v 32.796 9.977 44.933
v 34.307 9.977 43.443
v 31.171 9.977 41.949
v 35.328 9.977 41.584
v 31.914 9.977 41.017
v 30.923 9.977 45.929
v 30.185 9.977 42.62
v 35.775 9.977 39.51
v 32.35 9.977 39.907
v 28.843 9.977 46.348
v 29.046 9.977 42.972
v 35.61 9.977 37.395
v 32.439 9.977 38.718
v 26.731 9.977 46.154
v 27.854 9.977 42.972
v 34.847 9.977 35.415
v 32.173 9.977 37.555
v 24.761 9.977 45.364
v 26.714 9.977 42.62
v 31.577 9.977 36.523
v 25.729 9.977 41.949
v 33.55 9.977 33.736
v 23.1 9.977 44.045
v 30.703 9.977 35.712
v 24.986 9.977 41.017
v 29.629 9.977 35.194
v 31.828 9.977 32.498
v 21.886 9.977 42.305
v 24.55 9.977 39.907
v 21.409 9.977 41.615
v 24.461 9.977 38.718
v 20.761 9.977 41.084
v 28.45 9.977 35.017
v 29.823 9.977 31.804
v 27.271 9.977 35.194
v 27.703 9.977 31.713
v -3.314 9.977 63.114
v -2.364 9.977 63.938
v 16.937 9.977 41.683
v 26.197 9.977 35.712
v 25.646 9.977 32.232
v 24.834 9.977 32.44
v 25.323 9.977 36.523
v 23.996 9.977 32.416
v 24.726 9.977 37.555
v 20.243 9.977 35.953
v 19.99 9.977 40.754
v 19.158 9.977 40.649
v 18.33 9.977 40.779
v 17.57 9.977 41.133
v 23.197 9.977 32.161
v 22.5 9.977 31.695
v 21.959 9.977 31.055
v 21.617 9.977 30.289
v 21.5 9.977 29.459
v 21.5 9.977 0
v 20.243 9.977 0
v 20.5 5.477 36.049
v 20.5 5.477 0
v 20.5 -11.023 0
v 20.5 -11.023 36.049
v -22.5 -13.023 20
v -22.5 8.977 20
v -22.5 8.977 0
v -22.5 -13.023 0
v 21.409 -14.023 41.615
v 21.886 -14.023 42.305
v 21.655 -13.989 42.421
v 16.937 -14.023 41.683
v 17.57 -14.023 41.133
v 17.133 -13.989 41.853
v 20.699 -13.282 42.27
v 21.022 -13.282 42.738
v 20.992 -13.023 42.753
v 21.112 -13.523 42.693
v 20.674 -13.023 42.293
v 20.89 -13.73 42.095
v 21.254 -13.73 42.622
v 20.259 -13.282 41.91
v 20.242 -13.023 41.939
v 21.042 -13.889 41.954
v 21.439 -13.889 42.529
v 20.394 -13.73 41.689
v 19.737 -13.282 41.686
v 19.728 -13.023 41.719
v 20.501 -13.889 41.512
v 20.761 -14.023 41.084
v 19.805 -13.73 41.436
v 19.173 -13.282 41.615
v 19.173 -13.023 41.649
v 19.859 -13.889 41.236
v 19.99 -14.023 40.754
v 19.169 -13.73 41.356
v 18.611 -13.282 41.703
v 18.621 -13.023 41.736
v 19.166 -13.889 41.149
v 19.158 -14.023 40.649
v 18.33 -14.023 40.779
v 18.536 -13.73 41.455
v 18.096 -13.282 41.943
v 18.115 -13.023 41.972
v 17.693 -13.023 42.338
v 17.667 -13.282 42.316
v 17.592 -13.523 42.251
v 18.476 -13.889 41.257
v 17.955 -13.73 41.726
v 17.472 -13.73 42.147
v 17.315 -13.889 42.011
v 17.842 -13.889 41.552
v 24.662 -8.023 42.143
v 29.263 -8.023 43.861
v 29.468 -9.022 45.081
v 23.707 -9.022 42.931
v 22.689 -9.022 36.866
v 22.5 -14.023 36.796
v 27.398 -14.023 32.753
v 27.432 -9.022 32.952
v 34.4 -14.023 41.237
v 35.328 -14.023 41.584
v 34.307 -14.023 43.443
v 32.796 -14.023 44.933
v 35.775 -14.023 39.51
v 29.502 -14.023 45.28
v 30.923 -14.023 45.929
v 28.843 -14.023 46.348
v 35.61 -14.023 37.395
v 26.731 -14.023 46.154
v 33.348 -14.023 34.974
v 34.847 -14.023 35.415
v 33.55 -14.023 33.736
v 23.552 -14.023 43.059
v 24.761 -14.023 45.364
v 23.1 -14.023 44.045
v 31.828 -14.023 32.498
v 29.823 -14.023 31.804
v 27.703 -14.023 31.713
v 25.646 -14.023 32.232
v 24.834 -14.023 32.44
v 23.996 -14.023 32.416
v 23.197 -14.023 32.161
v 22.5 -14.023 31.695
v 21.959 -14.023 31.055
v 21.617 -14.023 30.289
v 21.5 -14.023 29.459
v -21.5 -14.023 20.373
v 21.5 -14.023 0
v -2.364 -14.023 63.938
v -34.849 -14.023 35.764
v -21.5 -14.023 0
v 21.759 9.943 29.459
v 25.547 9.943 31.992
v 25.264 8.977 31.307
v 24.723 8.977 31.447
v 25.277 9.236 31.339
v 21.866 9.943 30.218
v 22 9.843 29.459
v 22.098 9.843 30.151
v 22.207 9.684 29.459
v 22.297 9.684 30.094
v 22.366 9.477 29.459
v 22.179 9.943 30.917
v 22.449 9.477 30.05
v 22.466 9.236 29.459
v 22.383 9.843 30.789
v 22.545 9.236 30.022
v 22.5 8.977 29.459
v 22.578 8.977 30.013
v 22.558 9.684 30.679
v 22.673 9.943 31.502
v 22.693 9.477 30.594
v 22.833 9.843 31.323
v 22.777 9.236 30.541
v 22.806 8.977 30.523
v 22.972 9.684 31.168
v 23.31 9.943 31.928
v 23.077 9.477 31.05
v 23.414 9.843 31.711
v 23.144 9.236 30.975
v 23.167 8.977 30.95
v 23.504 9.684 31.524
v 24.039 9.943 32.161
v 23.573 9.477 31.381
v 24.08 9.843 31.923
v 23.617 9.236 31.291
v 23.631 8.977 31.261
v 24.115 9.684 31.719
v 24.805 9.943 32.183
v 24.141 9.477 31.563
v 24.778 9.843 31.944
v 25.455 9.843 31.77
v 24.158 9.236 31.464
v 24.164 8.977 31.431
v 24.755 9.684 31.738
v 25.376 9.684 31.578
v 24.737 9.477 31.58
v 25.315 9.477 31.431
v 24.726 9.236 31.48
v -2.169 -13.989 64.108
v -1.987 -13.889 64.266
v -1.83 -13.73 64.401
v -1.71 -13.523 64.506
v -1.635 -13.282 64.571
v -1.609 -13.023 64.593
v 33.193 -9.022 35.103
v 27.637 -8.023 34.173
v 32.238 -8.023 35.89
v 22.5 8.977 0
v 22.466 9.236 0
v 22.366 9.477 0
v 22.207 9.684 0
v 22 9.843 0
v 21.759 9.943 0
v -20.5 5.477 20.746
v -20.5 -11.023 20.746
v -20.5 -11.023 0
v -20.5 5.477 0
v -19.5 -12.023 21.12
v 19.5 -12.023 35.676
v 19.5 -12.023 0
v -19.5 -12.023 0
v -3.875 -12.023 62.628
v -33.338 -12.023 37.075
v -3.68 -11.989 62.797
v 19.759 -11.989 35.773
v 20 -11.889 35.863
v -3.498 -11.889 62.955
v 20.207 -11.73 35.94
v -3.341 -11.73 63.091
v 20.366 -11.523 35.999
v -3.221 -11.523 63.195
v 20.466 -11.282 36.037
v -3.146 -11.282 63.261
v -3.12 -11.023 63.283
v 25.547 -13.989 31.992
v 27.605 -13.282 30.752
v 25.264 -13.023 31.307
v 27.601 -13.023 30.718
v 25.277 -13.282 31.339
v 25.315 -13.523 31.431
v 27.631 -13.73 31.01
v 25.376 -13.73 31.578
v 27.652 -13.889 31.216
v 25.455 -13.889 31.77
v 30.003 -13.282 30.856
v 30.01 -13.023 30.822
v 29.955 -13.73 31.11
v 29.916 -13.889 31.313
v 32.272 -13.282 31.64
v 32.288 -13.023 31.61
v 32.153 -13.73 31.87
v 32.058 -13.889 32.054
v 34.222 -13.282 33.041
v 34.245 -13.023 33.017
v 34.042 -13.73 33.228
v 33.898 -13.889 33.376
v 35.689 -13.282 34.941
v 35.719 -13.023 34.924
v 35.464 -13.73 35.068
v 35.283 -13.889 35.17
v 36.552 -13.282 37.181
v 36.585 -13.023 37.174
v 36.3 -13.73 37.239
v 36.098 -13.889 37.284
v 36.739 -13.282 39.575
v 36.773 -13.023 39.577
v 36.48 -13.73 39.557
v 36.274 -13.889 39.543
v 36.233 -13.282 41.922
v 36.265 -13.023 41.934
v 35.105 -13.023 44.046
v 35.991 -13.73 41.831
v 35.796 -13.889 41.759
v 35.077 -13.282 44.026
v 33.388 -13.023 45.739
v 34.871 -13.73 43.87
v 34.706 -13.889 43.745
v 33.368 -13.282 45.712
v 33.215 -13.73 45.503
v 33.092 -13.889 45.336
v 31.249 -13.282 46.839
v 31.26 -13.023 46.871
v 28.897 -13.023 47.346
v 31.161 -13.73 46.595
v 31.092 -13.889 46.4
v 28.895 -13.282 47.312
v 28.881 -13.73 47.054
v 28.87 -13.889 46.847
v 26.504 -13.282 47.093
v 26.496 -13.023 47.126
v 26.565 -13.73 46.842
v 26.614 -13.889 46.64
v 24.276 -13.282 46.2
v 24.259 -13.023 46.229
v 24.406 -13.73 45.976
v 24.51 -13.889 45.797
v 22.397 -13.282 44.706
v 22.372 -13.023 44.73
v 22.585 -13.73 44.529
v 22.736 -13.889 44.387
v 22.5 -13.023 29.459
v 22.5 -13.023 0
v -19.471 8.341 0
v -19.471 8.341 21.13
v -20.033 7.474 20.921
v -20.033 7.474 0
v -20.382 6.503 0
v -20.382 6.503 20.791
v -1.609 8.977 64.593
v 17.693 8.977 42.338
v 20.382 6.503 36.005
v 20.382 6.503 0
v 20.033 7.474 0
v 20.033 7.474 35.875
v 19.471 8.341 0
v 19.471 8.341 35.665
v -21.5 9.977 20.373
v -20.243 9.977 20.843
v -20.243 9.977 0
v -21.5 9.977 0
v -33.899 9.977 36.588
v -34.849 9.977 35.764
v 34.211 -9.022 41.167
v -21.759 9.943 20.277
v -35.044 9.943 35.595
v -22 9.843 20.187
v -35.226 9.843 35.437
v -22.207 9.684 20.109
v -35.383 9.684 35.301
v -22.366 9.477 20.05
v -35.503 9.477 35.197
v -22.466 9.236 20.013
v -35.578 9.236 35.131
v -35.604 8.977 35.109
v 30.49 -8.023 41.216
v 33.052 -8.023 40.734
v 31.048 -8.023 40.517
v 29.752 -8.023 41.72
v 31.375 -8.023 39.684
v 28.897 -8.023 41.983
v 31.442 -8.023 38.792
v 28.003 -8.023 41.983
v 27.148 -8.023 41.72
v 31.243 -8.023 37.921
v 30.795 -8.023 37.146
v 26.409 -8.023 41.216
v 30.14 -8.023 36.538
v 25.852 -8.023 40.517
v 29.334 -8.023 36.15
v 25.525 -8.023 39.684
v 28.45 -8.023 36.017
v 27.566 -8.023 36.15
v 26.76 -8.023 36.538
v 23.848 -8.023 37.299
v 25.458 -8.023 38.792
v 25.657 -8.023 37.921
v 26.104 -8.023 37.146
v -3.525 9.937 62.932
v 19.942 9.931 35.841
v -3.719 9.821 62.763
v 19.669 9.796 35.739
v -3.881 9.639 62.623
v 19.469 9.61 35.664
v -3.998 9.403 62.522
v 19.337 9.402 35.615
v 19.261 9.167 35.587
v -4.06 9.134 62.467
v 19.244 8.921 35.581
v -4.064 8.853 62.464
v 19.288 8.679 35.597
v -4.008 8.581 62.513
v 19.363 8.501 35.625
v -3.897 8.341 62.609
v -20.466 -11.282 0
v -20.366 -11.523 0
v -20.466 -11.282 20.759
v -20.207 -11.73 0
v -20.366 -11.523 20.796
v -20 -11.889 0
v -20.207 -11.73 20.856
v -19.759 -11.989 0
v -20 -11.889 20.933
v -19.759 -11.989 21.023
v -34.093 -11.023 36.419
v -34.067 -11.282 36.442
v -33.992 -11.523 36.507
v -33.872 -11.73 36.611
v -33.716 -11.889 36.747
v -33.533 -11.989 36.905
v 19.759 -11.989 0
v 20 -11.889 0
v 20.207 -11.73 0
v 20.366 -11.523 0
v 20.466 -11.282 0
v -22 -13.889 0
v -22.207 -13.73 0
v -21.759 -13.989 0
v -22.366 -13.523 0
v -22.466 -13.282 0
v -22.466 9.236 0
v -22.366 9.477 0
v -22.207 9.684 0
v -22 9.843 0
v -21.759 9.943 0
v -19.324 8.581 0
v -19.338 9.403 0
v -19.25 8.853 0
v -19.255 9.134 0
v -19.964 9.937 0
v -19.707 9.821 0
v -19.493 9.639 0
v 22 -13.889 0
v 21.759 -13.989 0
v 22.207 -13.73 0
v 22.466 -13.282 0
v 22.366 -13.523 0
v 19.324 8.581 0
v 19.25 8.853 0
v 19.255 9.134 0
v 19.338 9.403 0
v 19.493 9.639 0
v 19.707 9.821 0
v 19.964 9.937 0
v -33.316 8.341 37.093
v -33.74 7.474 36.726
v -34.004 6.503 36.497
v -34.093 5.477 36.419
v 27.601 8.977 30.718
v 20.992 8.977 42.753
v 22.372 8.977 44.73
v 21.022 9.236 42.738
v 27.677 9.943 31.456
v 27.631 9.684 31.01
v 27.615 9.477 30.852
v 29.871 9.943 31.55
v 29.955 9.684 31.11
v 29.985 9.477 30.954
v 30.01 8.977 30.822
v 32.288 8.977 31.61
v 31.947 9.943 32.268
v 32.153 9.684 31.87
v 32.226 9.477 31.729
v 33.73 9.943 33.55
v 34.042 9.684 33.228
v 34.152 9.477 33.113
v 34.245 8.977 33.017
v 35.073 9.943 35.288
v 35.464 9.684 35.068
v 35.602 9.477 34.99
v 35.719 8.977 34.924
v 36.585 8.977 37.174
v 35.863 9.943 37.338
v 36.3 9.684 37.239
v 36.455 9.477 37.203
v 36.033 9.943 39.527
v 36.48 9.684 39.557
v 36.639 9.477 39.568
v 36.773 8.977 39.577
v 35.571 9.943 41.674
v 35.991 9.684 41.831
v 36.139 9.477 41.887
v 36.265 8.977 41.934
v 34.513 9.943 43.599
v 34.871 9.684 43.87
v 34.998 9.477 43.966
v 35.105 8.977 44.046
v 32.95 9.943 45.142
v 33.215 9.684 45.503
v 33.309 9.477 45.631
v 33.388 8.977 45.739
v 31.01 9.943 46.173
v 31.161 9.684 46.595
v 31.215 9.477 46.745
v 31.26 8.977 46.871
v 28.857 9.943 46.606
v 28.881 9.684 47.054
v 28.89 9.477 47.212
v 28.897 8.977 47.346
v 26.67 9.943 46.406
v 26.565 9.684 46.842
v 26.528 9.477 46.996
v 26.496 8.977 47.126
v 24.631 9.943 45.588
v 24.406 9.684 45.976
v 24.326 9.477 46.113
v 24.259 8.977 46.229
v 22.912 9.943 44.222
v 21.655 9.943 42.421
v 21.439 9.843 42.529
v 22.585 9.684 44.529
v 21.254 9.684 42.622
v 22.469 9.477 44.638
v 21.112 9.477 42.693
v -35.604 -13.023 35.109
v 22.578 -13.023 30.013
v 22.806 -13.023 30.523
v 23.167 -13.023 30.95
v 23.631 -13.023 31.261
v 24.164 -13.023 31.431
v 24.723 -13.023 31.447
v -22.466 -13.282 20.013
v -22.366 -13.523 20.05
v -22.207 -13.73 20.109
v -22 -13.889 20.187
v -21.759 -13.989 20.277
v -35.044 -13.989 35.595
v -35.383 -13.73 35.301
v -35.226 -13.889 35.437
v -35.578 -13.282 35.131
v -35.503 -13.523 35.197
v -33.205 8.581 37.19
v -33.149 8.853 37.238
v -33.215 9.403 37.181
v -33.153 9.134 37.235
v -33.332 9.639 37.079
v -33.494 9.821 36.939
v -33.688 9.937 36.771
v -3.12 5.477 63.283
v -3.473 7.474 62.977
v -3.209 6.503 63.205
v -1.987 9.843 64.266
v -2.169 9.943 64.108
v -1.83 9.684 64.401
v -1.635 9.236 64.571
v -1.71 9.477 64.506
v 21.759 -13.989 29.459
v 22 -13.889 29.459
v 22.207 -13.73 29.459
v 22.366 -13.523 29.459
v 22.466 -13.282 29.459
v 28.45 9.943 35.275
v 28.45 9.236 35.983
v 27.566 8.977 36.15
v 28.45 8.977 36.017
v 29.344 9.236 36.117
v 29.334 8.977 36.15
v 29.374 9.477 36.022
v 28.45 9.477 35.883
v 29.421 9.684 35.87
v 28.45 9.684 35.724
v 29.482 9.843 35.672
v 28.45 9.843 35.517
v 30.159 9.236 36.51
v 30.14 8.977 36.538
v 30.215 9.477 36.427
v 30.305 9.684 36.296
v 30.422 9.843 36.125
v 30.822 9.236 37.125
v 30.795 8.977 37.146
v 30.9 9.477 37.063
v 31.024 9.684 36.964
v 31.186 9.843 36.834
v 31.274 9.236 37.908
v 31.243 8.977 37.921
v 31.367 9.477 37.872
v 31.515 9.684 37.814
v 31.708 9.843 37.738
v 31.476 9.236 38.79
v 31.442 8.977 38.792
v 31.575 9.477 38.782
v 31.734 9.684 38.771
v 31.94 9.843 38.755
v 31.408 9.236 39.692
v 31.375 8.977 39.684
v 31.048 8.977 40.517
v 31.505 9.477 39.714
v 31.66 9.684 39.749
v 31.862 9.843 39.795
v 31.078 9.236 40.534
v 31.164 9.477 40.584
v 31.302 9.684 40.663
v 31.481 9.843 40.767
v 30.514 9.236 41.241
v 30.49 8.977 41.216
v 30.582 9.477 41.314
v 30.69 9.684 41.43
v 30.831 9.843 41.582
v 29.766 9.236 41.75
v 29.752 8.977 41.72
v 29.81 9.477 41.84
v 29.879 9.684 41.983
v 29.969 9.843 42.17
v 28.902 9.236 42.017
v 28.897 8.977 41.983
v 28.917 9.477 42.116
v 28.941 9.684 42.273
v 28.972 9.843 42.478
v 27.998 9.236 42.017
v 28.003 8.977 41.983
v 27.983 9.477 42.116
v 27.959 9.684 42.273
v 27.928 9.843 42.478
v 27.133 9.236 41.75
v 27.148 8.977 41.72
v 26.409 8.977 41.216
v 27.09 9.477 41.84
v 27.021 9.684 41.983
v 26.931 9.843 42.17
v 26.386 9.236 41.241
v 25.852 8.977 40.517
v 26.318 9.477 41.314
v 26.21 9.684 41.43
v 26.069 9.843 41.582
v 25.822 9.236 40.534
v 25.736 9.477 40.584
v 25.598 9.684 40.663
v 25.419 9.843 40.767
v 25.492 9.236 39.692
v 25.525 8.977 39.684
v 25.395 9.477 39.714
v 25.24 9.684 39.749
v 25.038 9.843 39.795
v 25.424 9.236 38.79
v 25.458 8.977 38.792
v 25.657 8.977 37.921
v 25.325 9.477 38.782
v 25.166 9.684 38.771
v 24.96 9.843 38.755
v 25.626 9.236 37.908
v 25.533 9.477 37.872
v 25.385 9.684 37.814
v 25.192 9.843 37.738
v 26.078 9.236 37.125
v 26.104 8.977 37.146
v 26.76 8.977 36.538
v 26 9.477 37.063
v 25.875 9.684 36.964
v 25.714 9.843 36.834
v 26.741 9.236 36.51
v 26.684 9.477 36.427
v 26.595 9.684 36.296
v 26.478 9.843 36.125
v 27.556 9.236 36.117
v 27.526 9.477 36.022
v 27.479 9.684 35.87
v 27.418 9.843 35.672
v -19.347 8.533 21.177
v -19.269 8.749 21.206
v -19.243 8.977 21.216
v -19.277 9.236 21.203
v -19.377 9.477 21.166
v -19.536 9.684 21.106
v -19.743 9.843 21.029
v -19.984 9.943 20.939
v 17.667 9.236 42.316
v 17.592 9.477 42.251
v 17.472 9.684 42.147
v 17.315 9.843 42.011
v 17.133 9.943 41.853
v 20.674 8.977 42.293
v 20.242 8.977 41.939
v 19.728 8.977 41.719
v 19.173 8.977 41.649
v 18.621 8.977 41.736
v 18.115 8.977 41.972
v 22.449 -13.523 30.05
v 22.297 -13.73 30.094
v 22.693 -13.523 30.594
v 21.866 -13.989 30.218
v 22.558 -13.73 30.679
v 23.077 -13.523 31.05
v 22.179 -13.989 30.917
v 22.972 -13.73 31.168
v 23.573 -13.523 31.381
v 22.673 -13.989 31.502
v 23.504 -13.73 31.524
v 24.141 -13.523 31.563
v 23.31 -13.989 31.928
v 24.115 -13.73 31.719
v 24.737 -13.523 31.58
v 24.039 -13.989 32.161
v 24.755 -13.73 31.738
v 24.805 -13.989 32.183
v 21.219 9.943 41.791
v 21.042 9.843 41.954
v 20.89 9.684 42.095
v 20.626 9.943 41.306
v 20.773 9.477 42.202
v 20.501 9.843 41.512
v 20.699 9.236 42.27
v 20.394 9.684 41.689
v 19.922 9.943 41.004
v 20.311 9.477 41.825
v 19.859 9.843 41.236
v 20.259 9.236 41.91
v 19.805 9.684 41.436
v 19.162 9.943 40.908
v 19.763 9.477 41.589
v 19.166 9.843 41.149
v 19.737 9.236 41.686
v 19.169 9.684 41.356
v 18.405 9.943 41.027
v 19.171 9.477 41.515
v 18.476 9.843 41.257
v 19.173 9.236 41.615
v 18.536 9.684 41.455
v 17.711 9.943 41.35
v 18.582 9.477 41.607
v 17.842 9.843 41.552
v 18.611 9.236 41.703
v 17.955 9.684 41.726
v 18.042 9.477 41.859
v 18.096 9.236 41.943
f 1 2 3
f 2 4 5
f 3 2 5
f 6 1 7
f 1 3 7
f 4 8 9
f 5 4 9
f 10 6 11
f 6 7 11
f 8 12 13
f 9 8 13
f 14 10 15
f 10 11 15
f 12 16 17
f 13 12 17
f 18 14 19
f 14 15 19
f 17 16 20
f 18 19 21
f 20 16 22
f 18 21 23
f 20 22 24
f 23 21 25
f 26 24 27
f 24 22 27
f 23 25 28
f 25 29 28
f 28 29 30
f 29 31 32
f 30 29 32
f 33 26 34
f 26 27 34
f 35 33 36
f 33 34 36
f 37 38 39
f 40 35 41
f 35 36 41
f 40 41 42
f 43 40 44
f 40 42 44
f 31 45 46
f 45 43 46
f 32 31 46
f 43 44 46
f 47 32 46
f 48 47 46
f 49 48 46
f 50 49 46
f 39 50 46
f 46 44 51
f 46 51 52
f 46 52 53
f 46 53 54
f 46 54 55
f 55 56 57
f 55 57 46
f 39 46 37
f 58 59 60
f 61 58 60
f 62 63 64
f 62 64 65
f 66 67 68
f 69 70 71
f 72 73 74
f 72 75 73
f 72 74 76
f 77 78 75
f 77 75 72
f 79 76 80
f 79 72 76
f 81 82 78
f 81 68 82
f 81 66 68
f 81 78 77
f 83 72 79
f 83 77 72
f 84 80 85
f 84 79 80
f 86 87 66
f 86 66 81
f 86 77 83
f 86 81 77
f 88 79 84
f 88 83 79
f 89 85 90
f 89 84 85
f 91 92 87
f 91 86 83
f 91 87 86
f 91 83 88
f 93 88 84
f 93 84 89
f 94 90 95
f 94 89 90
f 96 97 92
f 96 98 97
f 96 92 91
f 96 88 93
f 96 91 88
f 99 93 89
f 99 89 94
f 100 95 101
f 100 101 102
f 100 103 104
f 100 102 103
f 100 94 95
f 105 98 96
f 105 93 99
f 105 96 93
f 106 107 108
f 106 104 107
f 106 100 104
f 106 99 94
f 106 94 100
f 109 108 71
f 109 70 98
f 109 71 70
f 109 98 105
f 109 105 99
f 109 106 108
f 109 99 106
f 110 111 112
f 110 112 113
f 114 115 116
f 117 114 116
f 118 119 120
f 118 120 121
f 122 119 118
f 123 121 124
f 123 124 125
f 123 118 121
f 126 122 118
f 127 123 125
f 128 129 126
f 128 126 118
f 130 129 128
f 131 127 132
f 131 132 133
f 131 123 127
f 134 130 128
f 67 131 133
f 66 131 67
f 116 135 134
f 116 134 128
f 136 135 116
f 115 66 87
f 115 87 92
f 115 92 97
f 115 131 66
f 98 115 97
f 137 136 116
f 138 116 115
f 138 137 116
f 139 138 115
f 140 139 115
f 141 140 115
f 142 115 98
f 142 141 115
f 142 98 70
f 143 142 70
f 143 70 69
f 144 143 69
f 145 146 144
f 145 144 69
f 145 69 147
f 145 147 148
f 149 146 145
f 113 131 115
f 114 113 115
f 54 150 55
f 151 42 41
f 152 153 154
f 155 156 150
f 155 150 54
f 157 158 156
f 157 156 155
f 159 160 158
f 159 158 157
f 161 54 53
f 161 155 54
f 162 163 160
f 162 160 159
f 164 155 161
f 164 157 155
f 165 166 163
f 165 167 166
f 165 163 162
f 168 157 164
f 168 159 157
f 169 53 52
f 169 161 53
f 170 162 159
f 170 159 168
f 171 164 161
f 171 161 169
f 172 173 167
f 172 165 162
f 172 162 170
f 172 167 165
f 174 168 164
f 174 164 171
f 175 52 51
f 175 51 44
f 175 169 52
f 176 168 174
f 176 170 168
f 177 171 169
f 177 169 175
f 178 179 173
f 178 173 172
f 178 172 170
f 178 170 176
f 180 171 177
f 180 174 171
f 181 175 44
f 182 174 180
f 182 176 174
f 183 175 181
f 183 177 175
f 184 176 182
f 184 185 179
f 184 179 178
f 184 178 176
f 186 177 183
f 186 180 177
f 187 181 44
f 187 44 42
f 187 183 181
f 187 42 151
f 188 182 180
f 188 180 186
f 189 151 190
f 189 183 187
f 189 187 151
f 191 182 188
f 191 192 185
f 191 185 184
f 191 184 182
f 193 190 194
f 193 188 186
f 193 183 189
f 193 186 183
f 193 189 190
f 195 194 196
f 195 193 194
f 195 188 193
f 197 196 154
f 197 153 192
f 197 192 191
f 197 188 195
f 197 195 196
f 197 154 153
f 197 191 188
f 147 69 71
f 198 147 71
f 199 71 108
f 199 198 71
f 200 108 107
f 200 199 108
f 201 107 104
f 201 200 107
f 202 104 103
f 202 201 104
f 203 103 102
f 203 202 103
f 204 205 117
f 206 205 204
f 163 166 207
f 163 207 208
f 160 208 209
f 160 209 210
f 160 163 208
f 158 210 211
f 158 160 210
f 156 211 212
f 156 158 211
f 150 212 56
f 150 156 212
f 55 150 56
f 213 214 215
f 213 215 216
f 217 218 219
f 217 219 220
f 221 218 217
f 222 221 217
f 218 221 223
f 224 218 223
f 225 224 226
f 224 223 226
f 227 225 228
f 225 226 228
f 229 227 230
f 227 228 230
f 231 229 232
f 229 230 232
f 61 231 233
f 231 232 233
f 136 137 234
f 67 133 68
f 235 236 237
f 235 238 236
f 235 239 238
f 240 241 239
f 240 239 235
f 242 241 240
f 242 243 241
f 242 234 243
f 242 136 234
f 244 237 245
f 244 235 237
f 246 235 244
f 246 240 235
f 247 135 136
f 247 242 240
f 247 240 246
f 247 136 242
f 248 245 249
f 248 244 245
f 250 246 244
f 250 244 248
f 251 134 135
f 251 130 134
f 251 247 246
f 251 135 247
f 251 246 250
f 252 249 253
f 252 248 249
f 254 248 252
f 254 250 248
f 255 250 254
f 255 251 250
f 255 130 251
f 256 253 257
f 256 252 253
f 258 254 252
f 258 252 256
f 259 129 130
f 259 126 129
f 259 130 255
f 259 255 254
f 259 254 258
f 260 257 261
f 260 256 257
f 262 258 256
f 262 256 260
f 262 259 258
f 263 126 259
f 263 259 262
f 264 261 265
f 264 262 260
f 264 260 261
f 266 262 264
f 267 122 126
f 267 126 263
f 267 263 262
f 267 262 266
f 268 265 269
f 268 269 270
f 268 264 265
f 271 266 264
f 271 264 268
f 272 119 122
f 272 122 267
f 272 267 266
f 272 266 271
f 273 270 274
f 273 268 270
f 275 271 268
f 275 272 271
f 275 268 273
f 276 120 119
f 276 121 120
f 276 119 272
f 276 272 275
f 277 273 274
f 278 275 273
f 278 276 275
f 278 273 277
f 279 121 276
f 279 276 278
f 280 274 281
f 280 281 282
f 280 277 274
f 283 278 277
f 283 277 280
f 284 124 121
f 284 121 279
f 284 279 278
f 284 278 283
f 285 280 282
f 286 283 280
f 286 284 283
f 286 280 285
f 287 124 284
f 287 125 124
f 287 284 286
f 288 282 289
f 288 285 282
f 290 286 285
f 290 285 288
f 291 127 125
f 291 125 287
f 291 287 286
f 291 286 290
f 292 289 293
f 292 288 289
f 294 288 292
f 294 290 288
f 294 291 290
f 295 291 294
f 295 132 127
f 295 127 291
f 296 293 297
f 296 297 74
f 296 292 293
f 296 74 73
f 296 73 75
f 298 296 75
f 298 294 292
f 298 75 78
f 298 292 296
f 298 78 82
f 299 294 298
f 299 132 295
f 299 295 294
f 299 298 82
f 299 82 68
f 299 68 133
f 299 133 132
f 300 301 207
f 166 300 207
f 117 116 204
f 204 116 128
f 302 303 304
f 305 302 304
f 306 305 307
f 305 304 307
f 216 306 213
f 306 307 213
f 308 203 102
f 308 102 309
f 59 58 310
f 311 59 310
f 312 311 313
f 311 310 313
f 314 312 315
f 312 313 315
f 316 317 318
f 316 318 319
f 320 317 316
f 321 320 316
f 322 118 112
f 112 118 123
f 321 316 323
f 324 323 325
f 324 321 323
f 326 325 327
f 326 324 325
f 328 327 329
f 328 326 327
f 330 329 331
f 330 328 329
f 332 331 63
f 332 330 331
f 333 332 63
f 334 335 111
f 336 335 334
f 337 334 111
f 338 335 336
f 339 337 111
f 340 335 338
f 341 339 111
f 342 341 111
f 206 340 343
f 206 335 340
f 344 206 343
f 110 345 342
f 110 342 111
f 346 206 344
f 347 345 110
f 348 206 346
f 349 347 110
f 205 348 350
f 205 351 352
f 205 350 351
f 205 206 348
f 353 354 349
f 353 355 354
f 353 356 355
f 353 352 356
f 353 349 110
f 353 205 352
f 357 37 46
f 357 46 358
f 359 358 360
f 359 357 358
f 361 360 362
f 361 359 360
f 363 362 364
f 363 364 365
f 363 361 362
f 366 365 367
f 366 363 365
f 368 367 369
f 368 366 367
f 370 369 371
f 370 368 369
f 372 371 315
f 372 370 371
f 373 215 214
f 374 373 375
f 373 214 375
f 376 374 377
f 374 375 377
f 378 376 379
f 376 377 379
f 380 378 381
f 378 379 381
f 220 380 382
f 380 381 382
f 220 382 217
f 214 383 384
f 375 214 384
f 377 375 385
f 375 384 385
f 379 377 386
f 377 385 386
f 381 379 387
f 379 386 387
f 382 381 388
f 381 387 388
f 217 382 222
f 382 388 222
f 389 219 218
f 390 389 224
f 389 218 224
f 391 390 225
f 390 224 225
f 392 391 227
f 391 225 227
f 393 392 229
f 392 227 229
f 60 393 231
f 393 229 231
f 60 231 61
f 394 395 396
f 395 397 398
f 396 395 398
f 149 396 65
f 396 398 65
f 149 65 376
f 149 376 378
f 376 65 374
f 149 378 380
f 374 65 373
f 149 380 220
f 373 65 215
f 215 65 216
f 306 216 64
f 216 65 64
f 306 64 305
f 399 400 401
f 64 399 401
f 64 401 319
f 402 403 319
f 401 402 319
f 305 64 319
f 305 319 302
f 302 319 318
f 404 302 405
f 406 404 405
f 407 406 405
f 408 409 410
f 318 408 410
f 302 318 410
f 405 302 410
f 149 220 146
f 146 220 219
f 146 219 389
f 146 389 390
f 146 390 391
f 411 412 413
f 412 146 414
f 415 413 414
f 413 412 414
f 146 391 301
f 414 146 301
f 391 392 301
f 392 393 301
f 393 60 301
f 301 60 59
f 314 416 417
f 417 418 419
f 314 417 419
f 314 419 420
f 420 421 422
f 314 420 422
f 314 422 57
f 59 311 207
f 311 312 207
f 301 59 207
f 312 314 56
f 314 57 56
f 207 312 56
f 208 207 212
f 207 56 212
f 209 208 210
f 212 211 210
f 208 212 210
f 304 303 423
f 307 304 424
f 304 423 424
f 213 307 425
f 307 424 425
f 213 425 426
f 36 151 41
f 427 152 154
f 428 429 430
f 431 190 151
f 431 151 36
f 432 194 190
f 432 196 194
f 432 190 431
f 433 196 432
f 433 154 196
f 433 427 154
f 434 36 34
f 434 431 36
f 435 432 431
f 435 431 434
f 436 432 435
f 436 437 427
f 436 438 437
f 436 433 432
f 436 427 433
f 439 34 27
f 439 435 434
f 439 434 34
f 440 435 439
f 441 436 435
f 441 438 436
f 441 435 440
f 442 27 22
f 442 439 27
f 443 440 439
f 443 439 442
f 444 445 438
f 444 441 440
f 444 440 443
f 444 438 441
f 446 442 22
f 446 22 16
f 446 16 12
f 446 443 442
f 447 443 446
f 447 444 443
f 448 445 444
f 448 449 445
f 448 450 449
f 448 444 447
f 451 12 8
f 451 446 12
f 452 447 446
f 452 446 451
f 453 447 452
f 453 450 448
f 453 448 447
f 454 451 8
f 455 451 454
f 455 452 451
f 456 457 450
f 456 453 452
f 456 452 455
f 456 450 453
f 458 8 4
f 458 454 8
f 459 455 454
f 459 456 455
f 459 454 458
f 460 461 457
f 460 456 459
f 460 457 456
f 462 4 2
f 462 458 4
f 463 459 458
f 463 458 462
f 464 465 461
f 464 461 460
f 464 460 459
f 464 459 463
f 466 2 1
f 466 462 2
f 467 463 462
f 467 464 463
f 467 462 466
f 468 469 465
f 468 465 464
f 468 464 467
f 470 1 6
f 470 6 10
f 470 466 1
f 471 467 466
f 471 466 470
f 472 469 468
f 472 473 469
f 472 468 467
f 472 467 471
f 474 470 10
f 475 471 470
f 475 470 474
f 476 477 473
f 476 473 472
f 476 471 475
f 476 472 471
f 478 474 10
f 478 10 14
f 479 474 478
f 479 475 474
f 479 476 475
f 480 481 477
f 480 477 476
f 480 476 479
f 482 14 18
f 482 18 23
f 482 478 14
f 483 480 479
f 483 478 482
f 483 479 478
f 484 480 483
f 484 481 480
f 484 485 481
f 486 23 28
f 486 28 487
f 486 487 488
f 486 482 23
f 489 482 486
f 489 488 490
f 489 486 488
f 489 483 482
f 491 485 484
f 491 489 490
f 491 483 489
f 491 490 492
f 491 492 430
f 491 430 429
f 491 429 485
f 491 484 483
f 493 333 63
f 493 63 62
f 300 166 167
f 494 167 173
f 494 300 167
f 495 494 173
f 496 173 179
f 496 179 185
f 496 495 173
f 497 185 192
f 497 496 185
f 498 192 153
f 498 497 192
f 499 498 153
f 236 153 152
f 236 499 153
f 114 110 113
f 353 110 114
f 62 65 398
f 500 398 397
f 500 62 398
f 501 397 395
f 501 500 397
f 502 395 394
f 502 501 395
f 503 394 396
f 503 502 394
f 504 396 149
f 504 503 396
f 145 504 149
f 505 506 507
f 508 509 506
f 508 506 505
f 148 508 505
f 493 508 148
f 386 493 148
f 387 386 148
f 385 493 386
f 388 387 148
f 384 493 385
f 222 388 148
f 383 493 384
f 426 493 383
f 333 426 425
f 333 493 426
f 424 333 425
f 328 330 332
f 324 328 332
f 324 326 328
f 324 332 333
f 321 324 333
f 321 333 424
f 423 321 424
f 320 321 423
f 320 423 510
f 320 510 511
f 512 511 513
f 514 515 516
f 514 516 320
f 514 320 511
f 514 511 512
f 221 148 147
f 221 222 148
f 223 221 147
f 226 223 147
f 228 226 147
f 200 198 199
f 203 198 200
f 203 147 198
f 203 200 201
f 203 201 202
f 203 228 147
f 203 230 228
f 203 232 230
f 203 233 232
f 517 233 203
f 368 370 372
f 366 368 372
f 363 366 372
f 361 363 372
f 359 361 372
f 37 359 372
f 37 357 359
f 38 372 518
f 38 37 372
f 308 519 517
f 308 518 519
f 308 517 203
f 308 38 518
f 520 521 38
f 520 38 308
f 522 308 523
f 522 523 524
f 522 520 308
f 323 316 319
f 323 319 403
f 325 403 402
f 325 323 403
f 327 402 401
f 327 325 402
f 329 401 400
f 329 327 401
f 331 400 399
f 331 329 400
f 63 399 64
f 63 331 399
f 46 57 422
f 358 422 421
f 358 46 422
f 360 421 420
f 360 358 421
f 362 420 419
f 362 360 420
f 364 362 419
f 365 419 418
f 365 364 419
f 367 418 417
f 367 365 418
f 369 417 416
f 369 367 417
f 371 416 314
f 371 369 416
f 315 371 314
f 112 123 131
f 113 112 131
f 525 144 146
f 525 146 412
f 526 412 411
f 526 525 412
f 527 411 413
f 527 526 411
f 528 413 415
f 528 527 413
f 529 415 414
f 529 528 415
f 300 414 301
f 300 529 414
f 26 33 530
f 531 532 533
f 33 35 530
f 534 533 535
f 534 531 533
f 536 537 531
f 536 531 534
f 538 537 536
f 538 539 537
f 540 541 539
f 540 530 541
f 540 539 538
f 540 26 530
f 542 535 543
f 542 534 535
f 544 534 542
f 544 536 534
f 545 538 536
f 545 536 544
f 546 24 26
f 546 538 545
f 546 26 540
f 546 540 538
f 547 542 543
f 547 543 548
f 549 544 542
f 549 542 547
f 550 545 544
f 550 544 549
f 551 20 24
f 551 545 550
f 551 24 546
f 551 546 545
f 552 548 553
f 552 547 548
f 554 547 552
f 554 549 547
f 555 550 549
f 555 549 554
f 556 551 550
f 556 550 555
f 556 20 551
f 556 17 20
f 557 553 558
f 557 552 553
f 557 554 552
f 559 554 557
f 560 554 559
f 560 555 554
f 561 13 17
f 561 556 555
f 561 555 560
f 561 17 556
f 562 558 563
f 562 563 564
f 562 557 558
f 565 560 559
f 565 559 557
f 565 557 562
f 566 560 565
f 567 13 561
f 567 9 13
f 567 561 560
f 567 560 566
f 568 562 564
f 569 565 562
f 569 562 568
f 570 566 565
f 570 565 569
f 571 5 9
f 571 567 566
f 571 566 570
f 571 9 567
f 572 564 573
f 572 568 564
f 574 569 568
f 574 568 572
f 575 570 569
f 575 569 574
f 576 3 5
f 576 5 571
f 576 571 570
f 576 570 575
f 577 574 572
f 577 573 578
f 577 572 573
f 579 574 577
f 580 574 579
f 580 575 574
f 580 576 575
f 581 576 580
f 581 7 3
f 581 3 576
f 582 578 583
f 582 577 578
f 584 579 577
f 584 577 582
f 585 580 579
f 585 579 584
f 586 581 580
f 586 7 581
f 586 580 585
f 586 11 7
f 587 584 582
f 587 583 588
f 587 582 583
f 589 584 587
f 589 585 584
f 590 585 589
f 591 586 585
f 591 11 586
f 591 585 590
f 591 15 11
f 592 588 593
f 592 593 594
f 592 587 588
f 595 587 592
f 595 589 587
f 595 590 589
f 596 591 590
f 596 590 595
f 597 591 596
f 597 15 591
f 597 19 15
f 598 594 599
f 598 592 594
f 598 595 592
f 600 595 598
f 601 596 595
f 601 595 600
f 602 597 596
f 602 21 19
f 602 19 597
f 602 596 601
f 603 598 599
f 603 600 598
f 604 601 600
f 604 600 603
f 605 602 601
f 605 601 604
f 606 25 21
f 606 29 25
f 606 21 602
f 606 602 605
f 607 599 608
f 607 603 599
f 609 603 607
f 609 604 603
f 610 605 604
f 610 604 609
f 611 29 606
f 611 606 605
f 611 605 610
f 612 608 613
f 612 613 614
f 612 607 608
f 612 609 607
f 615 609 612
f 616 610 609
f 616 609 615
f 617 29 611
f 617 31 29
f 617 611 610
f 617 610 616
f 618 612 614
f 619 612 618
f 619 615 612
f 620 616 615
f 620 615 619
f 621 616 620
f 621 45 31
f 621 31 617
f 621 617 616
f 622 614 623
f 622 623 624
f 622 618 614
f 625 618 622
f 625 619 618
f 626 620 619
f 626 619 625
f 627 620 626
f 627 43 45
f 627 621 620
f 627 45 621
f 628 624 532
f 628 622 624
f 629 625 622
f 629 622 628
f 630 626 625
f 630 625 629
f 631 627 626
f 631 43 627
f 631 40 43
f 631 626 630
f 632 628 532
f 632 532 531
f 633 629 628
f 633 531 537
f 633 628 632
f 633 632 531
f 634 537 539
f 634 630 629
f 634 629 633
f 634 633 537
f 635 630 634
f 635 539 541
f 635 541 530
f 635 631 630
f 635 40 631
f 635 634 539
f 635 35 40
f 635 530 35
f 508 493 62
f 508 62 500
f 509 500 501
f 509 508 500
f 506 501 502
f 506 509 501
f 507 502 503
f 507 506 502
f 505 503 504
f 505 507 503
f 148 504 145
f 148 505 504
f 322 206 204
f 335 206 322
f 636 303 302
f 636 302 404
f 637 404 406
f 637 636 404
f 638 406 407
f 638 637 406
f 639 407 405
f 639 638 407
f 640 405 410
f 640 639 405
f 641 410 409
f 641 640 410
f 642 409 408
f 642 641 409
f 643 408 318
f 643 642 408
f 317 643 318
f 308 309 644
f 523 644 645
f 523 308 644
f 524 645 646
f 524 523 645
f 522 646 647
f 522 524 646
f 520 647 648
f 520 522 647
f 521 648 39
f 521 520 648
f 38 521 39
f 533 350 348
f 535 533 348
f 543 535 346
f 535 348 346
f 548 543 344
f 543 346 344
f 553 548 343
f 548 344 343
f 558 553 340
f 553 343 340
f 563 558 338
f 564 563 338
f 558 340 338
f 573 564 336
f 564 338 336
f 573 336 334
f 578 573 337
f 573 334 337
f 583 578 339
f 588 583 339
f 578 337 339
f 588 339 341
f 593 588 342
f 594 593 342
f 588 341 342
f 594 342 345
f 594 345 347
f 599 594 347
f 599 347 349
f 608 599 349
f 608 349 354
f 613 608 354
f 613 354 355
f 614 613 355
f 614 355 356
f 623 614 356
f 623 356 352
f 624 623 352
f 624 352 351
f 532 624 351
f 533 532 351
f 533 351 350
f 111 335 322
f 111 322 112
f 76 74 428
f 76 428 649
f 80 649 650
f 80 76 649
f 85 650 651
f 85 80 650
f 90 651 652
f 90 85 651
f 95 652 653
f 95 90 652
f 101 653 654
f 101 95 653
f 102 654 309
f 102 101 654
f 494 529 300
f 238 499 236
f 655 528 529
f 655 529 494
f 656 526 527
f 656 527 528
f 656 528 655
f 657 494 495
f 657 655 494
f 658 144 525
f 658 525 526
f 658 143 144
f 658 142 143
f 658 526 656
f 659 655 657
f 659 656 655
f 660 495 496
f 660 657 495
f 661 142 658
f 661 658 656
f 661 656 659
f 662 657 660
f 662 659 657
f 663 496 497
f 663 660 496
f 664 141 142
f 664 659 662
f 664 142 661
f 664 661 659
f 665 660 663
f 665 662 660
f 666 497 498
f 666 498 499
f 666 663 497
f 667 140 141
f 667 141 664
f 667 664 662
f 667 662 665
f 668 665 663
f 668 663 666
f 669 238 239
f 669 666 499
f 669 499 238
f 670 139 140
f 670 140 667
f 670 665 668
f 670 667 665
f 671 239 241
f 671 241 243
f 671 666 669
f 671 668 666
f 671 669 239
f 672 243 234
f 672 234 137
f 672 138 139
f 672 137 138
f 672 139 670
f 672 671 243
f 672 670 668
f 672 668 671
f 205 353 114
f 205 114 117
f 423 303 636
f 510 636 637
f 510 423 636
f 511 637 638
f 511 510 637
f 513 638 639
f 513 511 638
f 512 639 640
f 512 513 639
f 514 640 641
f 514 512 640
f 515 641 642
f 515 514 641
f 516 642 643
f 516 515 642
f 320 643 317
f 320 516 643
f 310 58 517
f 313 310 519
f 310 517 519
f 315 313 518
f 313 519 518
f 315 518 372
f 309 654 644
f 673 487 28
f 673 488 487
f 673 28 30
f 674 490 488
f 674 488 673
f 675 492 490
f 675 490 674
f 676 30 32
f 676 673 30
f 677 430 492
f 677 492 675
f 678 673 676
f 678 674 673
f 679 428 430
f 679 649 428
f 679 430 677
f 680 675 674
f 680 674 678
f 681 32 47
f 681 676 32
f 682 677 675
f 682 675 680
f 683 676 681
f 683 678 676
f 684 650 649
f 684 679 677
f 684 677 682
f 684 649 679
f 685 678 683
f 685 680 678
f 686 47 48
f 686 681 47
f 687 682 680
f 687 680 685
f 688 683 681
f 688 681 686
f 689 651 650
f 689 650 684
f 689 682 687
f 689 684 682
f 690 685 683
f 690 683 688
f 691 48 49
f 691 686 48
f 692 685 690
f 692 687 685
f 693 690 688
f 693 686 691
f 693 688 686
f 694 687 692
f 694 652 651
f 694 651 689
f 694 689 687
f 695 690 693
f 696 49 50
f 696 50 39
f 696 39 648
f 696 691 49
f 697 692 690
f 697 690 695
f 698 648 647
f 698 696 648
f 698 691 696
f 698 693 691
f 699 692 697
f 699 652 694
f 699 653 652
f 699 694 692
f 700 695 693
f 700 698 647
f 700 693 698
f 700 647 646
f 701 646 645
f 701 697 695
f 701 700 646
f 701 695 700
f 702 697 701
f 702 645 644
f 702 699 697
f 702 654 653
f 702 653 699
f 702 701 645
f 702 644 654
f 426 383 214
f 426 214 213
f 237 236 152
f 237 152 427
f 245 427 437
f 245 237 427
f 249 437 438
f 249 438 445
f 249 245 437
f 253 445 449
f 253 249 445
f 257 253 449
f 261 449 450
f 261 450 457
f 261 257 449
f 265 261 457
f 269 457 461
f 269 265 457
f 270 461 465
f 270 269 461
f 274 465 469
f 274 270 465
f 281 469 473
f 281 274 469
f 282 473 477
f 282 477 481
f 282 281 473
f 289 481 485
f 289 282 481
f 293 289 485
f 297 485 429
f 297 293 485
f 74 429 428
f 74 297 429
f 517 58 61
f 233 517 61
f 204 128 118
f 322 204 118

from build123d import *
from OCP.BRepFilletAPI import BRepFilletAPI_MakeChamfer

# Parameters (mm, degrees)
SKETCH4_R           = 2.9999999999999982
BOSS_EXTRUDE2_DEPTH = 24
CUT_EXTRUDE2_DEPTH  = 6
CUT_EXTRUDE2_DRAFT  = -2.0000000000000044
CHAMFER1_SIZE       = 1
CHAMFER1_SIZE2      = 1.0368159552784713
FILLET8_R           = 1


with BuildPart() as part:
    # Sweep1: sweep along a path in Sketch3
    with BuildLine(Plane(origin=(0, 0, 0), x_dir=(1, 0, 0), z_dir=(0, 1, 0))) as sweep1_path:
        Line((0, 0), (3.43e-15, -28.397932341701697))
        Line((3.43e-15, -28.397932341701697), (-18.606512367640427, -49.85114326213761))
    # Sketch1 → Sweep1 (sweep)
    with BuildSketch(Plane.XY):
        with BuildLine():
            Line((-19.500000000000004, -12.023018516113881), (19.500000000000004, -12.023018516113881))
            ThreePointArc((19.500000000000004, -12.023018516113881), (20.207106781186553, -11.730125297300427), (20.499999999999996, -11.02301851611388))
            Line((20.499999999999996, -11.02301851611388), (20.5, 5.476981483886118))
            ThreePointArc((20.5, 5.476981483886118), (20.235010721400677, 6.998390104086923), (19.471251471279412, 8.34061784752248))
            ThreePointArc((19.471251471279412, 8.34061784752248), (19.338106653385996, 9.403382916597337), (20.242640687119284, 9.976981483886115))
            Line((20.242640687119284, 9.976981483886115), (21.5, 9.976981483886117))
            ThreePointArc((21.5, 9.976981483886117), (22.207106781186546, 9.684088265072665), (22.5, 8.976981483886117))
            Line((22.5, 8.976981483886117), (22.500000000000004, -13.023018516113874))
            ThreePointArc((22.500000000000004, -13.023018516113874), (22.20710678118655, -13.730125297300424), (21.5, -14.023018516113883))
            Line((21.5, -14.023018516113883), (-21.5, -14.023018516113883))
            ThreePointArc((-21.5, -14.023018516113883), (-22.20710678118655, -13.730125297300424), (-22.500000000000004, -13.023018516113874))
            Line((-22.500000000000004, -13.023018516113874), (-22.5, 8.976981483886117))
            ThreePointArc((-22.5, 8.976981483886117), (-22.207106781186546, 9.684088265072665), (-21.5, 9.976981483886117))
            Line((-21.5, 9.976981483886117), (-20.242640687119284, 9.976981483886115))
            ThreePointArc((-20.242640687119284, 9.976981483886115), (-19.338106653385996, 9.403382916597337), (-19.471251471279412, 8.34061784752248))
            ThreePointArc((-19.471251471279412, 8.34061784752248), (-20.235010721400677, 6.998390104086923), (-20.5, 5.476981483886118))
            Line((-20.5, 5.476981483886118), (-20.499999999999996, -11.02301851611388))
            ThreePointArc((-20.499999999999996, -11.02301851611388), (-20.207106781186553, -11.730125297300429), (-19.500000000000004, -12.023018516113881))
        make_face()
    sweep(path=sweep1_path.line, transition=Transition.RIGHT)

    # Sketch4 → Boss-Extrude2 (add, through all)
    with BuildSketch(Plane(origin=(0, -14.023018516113883, 0), x_dir=(-1, 0, 0), z_dir=(0, -1, 0))):
        with BuildLine():
            Line((-21.5, -34.67531871716202), (-21.5, -29.459053367546638))
            Line((-21.5, -29.459053367546638), (-22.500000000000004, -29.459053367546638))
            ThreePointArc((-22.500000000000004, -29.459053367546638), (-23.388194611615152, -31.12154811290928), (-25.26388877835841, -31.307423983602327))
            ThreePointArc((-25.263888778358414, -31.307423983602334), (-36.264928425658965, -41.93350635482782), (-20.991916583156645, -42.753023981442176))
            ThreePointArc((-20.991916583156645, -42.75302398144217), (-19.45313679656983, -41.66447668579883), (-17.692872887894488, -42.33845696613024))
            Line((-17.692872887894488, -42.33845696613024), (-16.93742313675424, -41.68325037771543))
            Line((-16.93742313675424, -41.68325037771543), (-21.5, -36.42262324599441))
            Line((-21.5, -36.42262324599441), (-21.5, -34.67531871716202))
        make_face()
        with Locations(Location((-28.449921846657176, -39.01662206592069, 0), (0, 0, 90))):
            Circle(SKETCH4_R, mode=Mode.SUBTRACT)
    extrude(amount=-BOSS_EXTRUDE2_DEPTH)


with BuildPart() as cut_extrude2_tool:
    # Sketch5 → Cut-Extrude2 (with draft: the straight prism first)
    with BuildSketch(Plane(origin=(0, -14.023018516113883, 0), x_dir=(-1, 0, 0), z_dir=(0, -1, 0))):
        Polygon((-29.501650461083923, -45.27978422691646), (-23.551728614426768, -43.05902684439915), (-22.500000000000025, -36.79586468340338), (-27.39819323223043, -32.75345990492492), (-33.348115078887595, -34.974217287442244), (-34.39984369331434, -41.237379448438006), align=None)
    extrude(amount=-CUT_EXTRUDE2_DEPTH)
    # Cut-Extrude2: the draft: its side faces are tilted about the plane it starts from
    cut_extrude2_sides = [cut_extrude2_tool.faces().sort_by_distance(p)[0] for p in [
        (26.526689538, -11.023018516, 44.169405536),
        (23.025864307, -11.023018516, 39.927445764),
        (24.949096616, -11.023018516, 34.774662294),
        (30.373154156, -11.023018516, 33.863838596),
        (33.873979386, -11.023018516, 38.105798368),
        (31.950747077, -11.023018516, 43.258581838),
    ]]
    draft(cut_extrude2_sides, Plane(origin=(0, -14.023018516113883, 0), x_dir=(-1, 0, 0), z_dir=(0, -1, 0)), CUT_EXTRUDE2_DRAFT)


with BuildPart() as part_1:
    add(part.part)

    # Cut-Extrude2: cut by cut_extrude2_tool
    add(cut_extrude2_tool.part, mode=Mode.SUBTRACT)

    # Chamfer1: one chamfer whose edges measure the first distance from different faces: ONE call of the kernel's chamfer builder (chamfer() names one face for all edges)
    chamfer1_edges_1 = [part_1.edges().sort_by_distance(p)[0] for p in [
        (33.667347826415636, -8.023018516113883, 38.14049654729082),
    ]]
    chamfer1_side_1 = [part_1.faces().sort_by_distance(p)[0] for p in [
        (33.77133231943445, -11.042436068122724, 38.123035165331785),
    ]]
    chamfer1_edges_2 = [part_1.edges().sort_by_distance(p)[0] for p in [
        (30.299887880499114, -8.023018516113883, 34.060135865770036),
    ]]
    chamfer1_side_2 = [part_1.faces().sort_by_distance(p)[0] for p in [
        (30.336758126646806, -11.042436068122724, 33.96135196223658),
    ]]
    chamfer1_edges_3 = [part_1.edges().sort_by_distance(p)[0] for p in [
        (25.08246190074066, -8.023018516113883, 34.936261384399906),
    ]]
    chamfer1_side_3 = [part_1.faces().sort_by_distance(p)[0] for p in [
        (25.015347653869544, -11.042436068122724, 34.854938862825485),
    ]]
    chamfer1_edges_4 = [part_1.edges().sort_by_distance(p)[0] for p in [
        (23.232495866898734, -8.023018516113883, 39.89274758455057),
    ]]
    chamfer1_side_4 = [part_1.faces().sort_by_distance(p)[0] for p in [
        (23.12851137387992, -11.042436068122724, 39.91020896650961),
    ]]
    chamfer1_edges_5 = [part_1.edges().sort_by_distance(p)[0] for p in [
        (26.599955812815256, -8.023018516113883, 43.97310826607136),
    ]]
    chamfer1_side_5 = [part_1.faces().sort_by_distance(p)[0] for p in [
        (26.56308556666756, -11.042436068122724, 44.07189216960481),
    ]]
    chamfer1_edges_6 = [part_1.edges().sort_by_distance(p)[0] for p in [
        (31.81738179257371, -8.023018516113883, 43.09698274744148),
    ]]
    chamfer1_side_6 = [part_1.faces().sort_by_distance(p)[0] for p in [
        (31.88449603944482, -11.042436068122724, 43.178305269015894),
    ]]
    chamfer1 = BRepFilletAPI_MakeChamfer(part_1.part.solid().wrapped)
    for e in chamfer1_edges_1:
        chamfer1.Add(CHAMFER1_SIZE, CHAMFER1_SIZE2, e.wrapped, chamfer1_side_1[0].wrapped)  # the first distance lies on this face
    for e in chamfer1_edges_2:
        chamfer1.Add(CHAMFER1_SIZE, CHAMFER1_SIZE2, e.wrapped, chamfer1_side_2[0].wrapped)  # the first distance lies on this face
    for e in chamfer1_edges_3:
        chamfer1.Add(CHAMFER1_SIZE, CHAMFER1_SIZE2, e.wrapped, chamfer1_side_3[0].wrapped)  # the first distance lies on this face
    for e in chamfer1_edges_4:
        chamfer1.Add(CHAMFER1_SIZE, CHAMFER1_SIZE2, e.wrapped, chamfer1_side_4[0].wrapped)  # the first distance lies on this face
    for e in chamfer1_edges_5:
        chamfer1.Add(CHAMFER1_SIZE, CHAMFER1_SIZE2, e.wrapped, chamfer1_side_5[0].wrapped)  # the first distance lies on this face
    for e in chamfer1_edges_6:
        chamfer1.Add(CHAMFER1_SIZE, CHAMFER1_SIZE2, e.wrapped, chamfer1_side_6[0].wrapped)  # the first distance lies on this face
    add(Compound.cast(chamfer1.Shape()), mode=Mode.REPLACE)

    # Fillet8
    # the kernel refuses this fillet: 1 mm, written as the material it takes off along each edge
    with BuildSketch(Plane(origin=(24.500000000000004, -14.023018516113883, 29.459053367546634), x_dir=(-0.31457819430358575, 0, -0.9492315627225506), z_dir=(0.9492315627225506, 0, -0.31457819430358575))) as fillet8_piece_1:
        with BuildLine():
            CenterArc((2 + FILLET8_R, FILLET8_R), FILLET8_R, 180, 90)
            Line((2, FILLET8_R), (2, 0))
            Line((2, 0), (2 + FILLET8_R, 0))
        make_face()
    revolve(axis=Axis((24.500000000000004, -14.023018516113883, 29.459053367546634), (0, 1, 0)), revolution_arc=184.1188230563678, mode=Mode.SUBTRACT)
    with BuildSketch(Plane(origin=(24.500000000000004, 9.976981483886117, 29.459053367546634), x_dir=(-0.31457819430358197, 0, -0.9492315627225518), z_dir=(0.9492315627225518, 0, -0.31457819430358197))) as fillet8_piece_2:
        with BuildLine():
            CenterArc((2.000000000000001 + FILLET8_R, -FILLET8_R), FILLET8_R, 90, 90)
            Line((2.000000000000001 + FILLET8_R, 3.55e-15), (2.000000000000001, 3.55e-15))
            Line((2.000000000000001, 3.55e-15), (2.000000000000001, -FILLET8_R))
        make_face()
    revolve(axis=Axis((24.500000000000004, 9.976981483886117, 29.459053367546634), (0, 1, 0)), revolution_arc=184.11882305636792, mode=Mode.SUBTRACT)
    with BuildSketch(Plane(origin=(19.20377239017497, -14.023018516113883, 43.64887014295982), x_dir=(0.8940720964908377, 0, -0.4479230807588265), z_dir=(0.4479230807588265, 0, 0.8940720964908377))) as fillet8_piece_3:
        with BuildLine():
            CenterArc((2.0000000000000004 + FILLET8_R, FILLET8_R), FILLET8_R, 180, 90)
            Line((2.000000000000001, FILLET8_R), (2.0000000000000004, 0))
            Line((2.0000000000000004, 0), (2.0000000000000004 + FILLET8_R, 0))
        make_face()
    revolve(axis=Axis((19.20377239017497, -14.023018516113883, 43.64887014295982), (0, 1, 0)), revolution_arc=184.1188230563678, mode=Mode.SUBTRACT)
    with BuildSketch(Plane(origin=(19.20377239017497, 9.976981483886117, 43.64887014295982), x_dir=(0.8940720964908377, 0, -0.4479230807588265), z_dir=(0.4479230807588265, 0, 0.8940720964908377))) as fillet8_piece_4:
        with BuildLine():
            CenterArc((2.0000000000000004 + FILLET8_R, -FILLET8_R), FILLET8_R, 90.00000000000018, 89.99999999999983)
            Line((2.0000000000000004 + FILLET8_R, 0), (2.0000000000000004, 0))
            Line((2.0000000000000004, 0), (2.000000000000001, -FILLET8_R))
        make_face()
    revolve(axis=Axis((19.20377239017497, 9.976981483886117, 43.64887014295982), (0, 1, 0)), revolution_arc=184.1188230563678, mode=Mode.SUBTRACT)
    with BuildSketch(Plane(origin=(28.449921846657183, -14.023018516113883, 39.0166220659207), x_dir=(-0.3819443891792063, 0, -0.9241853080278452), z_dir=(-0.9241853080278452, 0, 0.3819443891792063))) as fillet8_piece_5:
        with BuildLine():
            CenterArc((8.341615058531193 - FILLET8_R, -FILLET8_R), FILLET8_R, 0, 90)
            Line((8.34161505853119, -FILLET8_R), (8.341615058531193, 0))
            Line((8.341615058531193, 0), (8.341615058531193 - FILLET8_R, 0))
        make_face()
    revolve(axis=Axis((28.449921846657183, -14.023018516113883, 39.0166220659207), (0, -1, 0)), revolution_arc=265.84366585936306, mode=Mode.SUBTRACT)
    with BuildSketch(Plane(origin=(28.449921846657183, 9.976981483886117, 39.0166220659207), x_dir=(-0.3819443891792063, 0, -0.9241853080278452), z_dir=(-0.9241853080278452, 0, 0.3819443891792063))) as fillet8_piece_6:
        with BuildLine():
            CenterArc((8.341615058531193 - FILLET8_R, FILLET8_R), FILLET8_R, 270.00000000000034, 89.99999999999966)
            Line((8.341615058531193 - FILLET8_R, 0), (8.341615058531193, 0))
            Line((8.341615058531193, 0), (8.34161505853119, FILLET8_R))
        make_face()
    revolve(axis=Axis((28.449921846657183, 9.976981483886117, 39.0166220659207), (0, -1, 0)), revolution_arc=265.84366585936306, mode=Mode.SUBTRACT)
    with BuildSketch(Plane(origin=(28.449921846657176, 9.976981483886117, 39.01662206592069), x_dir=(0, 0, -1), z_dir=(-1, 0, 0))) as fillet8_piece_7:
        with BuildLine():
            CenterArc((3 + FILLET8_R, FILLET8_R), FILLET8_R, 180, 90)
            Line((3 + FILLET8_R, 0), (3, 0))
            Line((3, 0), (3, FILLET8_R))
        make_face()
    revolve(axis=Axis((28.449921846657176, 9.976981483886117, 39.01662206592069), (0, -1, 0)), mode=Mode.SUBTRACT)


solid = part_1.part
